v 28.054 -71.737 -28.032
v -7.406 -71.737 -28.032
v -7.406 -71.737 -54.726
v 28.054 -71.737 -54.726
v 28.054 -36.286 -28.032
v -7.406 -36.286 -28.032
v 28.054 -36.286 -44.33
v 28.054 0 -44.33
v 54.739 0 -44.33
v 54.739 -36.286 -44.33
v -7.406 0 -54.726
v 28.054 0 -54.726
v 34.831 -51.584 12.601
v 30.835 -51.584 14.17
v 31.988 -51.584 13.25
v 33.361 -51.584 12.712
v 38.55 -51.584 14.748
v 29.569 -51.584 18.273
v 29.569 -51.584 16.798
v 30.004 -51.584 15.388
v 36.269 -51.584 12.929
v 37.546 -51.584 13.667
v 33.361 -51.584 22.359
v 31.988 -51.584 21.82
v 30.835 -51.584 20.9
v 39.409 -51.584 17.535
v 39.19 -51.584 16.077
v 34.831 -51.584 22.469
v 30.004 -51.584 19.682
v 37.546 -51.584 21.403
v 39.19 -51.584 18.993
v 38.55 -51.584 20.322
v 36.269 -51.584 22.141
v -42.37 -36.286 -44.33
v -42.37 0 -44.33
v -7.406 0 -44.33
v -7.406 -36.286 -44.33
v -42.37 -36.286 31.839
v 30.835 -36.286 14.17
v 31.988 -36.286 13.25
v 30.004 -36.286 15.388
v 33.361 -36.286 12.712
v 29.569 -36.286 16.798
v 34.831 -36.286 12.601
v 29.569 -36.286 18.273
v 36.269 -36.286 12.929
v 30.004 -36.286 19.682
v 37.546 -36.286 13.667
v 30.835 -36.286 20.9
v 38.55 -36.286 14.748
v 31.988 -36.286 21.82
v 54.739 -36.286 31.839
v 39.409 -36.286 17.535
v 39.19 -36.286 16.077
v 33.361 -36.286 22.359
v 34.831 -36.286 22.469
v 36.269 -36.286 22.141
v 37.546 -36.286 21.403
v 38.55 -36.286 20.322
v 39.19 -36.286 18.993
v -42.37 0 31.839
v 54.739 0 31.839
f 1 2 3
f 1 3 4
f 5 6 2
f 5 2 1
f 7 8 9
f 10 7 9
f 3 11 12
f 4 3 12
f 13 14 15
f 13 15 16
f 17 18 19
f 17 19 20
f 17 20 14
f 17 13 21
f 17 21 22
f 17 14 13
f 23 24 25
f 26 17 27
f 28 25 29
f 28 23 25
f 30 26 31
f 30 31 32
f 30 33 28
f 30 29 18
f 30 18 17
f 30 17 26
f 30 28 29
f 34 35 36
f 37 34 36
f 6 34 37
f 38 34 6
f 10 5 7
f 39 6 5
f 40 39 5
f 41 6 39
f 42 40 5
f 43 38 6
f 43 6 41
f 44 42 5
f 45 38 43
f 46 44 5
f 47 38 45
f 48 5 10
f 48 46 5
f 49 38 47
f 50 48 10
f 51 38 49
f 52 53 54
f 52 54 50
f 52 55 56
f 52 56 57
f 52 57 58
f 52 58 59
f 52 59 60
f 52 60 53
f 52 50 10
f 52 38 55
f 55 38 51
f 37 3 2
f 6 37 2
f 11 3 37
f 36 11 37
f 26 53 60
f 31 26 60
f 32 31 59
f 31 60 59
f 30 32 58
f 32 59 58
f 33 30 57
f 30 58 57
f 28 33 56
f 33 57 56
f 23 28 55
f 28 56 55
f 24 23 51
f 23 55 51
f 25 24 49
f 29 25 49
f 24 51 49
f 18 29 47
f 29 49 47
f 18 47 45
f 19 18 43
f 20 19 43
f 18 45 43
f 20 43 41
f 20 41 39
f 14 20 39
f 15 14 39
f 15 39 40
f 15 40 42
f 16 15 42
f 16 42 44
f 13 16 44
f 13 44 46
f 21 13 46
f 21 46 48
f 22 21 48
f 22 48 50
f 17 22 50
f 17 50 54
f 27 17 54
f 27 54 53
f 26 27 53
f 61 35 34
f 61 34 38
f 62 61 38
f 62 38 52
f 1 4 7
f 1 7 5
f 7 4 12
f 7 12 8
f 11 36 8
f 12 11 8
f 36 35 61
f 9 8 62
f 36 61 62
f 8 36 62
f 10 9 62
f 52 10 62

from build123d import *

# Parameters (mm, degrees)
F0_W     = 97.109213
F0_H     = 76.168887
F1_DEPTH = 36.286205
F2_R     = 4.947674
F3_DEPTH = 51.584408
F4_W     = 35.460181
F4_H     = 26.693367
F5_DEPTH = 71.737379


with BuildPart() as f1:
    # F0 (on Front) → F1 (new body)
    with BuildSketch(Plane.XZ):
        with Locations((6.184138, -6.245349)):
            Rectangle(F0_W, F0_H)
    extrude(amount=F1_DEPTH)

    # F2 (on Front) → F3 (join)
    with BuildSketch(Plane.XZ):
        with Locations((34.461668, 17.535143)):
            Circle(F2_R)
    extrude(amount=F3_DEPTH)

    # F4 (on Front) → F5 (join)
    with BuildSketch(Plane.XZ):
        with Locations((10.323982, -41.378926)):
            Rectangle(F4_W, F4_H)
    extrude(amount=F5_DEPTH)


solid = f1.part
